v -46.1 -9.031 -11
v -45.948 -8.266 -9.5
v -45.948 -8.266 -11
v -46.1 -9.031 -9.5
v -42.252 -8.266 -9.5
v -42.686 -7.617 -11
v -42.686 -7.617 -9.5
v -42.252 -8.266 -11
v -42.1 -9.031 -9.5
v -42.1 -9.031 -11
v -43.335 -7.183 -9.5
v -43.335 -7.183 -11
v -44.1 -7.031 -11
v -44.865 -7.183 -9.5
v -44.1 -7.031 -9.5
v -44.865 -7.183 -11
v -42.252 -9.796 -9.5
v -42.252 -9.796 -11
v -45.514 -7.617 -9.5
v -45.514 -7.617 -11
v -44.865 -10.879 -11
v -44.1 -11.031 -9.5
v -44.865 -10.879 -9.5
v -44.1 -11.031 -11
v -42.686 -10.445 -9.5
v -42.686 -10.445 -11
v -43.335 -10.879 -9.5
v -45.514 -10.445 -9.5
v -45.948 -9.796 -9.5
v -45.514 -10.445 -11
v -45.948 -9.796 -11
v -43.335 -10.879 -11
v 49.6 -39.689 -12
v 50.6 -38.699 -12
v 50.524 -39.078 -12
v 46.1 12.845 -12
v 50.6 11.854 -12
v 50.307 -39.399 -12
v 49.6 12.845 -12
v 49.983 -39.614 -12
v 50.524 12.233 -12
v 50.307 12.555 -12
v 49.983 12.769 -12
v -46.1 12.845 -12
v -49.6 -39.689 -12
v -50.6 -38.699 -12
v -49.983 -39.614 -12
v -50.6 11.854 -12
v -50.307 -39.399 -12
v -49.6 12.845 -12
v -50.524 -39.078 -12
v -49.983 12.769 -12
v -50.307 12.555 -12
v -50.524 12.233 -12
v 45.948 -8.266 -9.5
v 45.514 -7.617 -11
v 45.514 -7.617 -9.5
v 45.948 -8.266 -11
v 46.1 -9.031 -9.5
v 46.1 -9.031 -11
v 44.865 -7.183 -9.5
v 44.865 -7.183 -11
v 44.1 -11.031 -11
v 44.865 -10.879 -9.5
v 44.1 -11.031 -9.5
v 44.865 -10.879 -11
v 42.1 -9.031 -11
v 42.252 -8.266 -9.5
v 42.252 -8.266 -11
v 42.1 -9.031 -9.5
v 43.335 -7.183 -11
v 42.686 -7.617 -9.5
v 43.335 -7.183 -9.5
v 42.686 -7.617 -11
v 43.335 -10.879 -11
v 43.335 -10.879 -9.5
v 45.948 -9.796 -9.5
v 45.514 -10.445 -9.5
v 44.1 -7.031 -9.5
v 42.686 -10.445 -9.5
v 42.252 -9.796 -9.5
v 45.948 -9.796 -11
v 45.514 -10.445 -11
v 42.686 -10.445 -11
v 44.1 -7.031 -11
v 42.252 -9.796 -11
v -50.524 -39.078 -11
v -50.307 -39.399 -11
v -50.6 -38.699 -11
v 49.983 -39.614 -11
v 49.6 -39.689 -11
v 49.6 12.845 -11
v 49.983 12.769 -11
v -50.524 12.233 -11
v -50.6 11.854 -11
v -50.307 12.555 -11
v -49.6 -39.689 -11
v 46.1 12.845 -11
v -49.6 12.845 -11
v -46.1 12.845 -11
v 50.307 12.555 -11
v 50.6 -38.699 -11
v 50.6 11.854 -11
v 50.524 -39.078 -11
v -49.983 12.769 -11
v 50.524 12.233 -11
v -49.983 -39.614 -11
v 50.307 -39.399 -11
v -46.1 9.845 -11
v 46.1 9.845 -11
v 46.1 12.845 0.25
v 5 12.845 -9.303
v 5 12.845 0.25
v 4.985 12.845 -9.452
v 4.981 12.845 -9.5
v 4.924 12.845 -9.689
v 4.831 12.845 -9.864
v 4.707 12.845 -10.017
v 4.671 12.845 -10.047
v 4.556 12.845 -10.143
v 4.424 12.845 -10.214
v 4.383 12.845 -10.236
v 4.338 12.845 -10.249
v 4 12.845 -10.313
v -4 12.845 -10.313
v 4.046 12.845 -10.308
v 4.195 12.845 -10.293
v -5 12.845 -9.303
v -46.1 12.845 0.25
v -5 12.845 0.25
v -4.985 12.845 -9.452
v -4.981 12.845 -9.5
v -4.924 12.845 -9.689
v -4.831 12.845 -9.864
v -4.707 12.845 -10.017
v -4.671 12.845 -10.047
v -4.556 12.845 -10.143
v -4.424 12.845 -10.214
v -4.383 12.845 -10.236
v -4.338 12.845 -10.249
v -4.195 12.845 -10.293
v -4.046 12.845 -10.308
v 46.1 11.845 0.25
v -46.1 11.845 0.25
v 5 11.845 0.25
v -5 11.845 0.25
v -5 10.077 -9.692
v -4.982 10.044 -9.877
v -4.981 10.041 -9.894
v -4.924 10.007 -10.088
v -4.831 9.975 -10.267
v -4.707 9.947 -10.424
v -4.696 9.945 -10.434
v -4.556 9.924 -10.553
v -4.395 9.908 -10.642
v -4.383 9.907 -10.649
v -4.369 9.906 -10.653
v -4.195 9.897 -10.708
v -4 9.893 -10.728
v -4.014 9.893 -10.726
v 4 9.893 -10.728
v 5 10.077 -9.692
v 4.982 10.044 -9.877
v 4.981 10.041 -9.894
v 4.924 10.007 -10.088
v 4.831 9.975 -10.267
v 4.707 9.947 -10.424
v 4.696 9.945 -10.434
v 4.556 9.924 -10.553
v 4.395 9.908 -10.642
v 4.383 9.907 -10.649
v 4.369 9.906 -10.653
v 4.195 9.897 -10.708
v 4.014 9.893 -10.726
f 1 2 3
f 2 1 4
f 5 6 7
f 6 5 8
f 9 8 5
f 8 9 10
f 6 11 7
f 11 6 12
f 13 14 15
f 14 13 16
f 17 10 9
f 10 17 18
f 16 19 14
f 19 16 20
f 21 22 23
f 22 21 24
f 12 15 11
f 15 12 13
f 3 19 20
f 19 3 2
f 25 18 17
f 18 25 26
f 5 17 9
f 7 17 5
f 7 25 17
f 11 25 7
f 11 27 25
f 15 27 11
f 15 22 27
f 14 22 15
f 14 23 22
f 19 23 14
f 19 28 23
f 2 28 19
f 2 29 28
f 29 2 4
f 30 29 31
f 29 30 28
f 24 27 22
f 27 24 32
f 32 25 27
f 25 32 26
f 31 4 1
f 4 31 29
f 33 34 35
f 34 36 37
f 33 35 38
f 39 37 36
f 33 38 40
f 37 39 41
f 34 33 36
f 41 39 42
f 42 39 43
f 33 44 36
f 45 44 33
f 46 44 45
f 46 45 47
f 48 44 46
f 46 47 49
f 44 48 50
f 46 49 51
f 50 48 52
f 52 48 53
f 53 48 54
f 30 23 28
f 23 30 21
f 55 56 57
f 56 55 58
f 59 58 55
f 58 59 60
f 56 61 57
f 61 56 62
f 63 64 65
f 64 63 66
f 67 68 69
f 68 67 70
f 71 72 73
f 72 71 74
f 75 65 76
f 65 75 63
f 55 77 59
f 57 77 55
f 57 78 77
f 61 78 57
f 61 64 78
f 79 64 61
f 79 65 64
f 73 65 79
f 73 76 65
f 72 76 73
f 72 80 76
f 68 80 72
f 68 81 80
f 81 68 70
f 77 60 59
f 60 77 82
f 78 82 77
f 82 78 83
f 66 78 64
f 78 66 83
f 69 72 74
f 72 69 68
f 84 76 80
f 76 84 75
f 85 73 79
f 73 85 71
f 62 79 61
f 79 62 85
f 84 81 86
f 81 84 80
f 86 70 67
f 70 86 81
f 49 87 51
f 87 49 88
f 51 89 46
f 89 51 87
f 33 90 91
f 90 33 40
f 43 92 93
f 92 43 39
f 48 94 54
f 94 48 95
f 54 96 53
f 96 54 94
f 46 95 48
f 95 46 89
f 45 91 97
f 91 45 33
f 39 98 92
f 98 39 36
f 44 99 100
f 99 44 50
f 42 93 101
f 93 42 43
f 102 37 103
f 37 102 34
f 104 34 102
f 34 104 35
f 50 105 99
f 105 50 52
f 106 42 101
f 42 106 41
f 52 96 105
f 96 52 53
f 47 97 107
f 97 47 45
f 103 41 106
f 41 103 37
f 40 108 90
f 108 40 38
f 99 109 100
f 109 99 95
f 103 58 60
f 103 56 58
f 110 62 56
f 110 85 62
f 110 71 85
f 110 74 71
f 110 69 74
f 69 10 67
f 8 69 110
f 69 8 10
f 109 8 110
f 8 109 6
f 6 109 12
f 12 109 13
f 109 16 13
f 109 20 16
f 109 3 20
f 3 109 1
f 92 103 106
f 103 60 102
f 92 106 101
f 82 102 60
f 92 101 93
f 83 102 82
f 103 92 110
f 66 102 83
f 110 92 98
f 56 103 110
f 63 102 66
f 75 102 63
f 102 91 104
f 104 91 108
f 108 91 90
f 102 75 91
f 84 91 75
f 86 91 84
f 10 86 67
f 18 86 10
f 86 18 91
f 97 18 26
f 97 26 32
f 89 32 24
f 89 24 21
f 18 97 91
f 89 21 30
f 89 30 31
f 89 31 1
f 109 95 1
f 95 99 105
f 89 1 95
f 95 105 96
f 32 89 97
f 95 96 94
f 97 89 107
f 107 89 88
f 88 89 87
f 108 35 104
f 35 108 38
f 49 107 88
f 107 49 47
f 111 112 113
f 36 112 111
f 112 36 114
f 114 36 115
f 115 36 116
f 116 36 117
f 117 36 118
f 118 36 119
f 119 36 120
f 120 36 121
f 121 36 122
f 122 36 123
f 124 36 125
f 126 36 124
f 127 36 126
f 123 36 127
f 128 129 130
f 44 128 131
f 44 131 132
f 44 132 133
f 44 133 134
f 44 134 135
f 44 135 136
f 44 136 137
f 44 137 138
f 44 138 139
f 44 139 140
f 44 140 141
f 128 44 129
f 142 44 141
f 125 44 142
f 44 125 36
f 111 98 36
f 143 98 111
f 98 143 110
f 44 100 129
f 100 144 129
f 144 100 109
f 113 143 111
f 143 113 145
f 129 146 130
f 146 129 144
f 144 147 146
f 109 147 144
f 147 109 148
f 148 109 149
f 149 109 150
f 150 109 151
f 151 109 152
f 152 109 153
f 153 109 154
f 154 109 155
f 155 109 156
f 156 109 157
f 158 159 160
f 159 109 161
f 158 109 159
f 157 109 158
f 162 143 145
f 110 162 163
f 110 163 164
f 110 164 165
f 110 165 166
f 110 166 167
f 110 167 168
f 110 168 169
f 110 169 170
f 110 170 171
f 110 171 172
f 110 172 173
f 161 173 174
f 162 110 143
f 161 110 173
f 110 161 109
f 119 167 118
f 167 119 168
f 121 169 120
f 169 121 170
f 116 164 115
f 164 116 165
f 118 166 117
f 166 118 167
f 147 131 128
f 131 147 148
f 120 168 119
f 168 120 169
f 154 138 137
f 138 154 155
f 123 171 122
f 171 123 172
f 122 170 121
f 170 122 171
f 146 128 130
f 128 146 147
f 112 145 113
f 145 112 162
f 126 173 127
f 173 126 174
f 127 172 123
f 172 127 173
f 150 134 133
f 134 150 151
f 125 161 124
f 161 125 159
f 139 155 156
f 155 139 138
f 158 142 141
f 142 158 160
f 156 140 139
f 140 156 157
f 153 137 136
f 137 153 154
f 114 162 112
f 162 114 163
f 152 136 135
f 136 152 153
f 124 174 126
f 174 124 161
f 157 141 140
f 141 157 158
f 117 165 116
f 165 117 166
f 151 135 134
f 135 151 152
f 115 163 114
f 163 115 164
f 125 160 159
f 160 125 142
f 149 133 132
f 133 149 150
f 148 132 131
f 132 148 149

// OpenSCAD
include <drink-me.scad>

present() {
     /* case_3d(); */
     /* rest_3d(); */
     base_3d();
     /* pcb_3d(); */
     /* switches_3d(); */
     /* keys_3d(); */
}
